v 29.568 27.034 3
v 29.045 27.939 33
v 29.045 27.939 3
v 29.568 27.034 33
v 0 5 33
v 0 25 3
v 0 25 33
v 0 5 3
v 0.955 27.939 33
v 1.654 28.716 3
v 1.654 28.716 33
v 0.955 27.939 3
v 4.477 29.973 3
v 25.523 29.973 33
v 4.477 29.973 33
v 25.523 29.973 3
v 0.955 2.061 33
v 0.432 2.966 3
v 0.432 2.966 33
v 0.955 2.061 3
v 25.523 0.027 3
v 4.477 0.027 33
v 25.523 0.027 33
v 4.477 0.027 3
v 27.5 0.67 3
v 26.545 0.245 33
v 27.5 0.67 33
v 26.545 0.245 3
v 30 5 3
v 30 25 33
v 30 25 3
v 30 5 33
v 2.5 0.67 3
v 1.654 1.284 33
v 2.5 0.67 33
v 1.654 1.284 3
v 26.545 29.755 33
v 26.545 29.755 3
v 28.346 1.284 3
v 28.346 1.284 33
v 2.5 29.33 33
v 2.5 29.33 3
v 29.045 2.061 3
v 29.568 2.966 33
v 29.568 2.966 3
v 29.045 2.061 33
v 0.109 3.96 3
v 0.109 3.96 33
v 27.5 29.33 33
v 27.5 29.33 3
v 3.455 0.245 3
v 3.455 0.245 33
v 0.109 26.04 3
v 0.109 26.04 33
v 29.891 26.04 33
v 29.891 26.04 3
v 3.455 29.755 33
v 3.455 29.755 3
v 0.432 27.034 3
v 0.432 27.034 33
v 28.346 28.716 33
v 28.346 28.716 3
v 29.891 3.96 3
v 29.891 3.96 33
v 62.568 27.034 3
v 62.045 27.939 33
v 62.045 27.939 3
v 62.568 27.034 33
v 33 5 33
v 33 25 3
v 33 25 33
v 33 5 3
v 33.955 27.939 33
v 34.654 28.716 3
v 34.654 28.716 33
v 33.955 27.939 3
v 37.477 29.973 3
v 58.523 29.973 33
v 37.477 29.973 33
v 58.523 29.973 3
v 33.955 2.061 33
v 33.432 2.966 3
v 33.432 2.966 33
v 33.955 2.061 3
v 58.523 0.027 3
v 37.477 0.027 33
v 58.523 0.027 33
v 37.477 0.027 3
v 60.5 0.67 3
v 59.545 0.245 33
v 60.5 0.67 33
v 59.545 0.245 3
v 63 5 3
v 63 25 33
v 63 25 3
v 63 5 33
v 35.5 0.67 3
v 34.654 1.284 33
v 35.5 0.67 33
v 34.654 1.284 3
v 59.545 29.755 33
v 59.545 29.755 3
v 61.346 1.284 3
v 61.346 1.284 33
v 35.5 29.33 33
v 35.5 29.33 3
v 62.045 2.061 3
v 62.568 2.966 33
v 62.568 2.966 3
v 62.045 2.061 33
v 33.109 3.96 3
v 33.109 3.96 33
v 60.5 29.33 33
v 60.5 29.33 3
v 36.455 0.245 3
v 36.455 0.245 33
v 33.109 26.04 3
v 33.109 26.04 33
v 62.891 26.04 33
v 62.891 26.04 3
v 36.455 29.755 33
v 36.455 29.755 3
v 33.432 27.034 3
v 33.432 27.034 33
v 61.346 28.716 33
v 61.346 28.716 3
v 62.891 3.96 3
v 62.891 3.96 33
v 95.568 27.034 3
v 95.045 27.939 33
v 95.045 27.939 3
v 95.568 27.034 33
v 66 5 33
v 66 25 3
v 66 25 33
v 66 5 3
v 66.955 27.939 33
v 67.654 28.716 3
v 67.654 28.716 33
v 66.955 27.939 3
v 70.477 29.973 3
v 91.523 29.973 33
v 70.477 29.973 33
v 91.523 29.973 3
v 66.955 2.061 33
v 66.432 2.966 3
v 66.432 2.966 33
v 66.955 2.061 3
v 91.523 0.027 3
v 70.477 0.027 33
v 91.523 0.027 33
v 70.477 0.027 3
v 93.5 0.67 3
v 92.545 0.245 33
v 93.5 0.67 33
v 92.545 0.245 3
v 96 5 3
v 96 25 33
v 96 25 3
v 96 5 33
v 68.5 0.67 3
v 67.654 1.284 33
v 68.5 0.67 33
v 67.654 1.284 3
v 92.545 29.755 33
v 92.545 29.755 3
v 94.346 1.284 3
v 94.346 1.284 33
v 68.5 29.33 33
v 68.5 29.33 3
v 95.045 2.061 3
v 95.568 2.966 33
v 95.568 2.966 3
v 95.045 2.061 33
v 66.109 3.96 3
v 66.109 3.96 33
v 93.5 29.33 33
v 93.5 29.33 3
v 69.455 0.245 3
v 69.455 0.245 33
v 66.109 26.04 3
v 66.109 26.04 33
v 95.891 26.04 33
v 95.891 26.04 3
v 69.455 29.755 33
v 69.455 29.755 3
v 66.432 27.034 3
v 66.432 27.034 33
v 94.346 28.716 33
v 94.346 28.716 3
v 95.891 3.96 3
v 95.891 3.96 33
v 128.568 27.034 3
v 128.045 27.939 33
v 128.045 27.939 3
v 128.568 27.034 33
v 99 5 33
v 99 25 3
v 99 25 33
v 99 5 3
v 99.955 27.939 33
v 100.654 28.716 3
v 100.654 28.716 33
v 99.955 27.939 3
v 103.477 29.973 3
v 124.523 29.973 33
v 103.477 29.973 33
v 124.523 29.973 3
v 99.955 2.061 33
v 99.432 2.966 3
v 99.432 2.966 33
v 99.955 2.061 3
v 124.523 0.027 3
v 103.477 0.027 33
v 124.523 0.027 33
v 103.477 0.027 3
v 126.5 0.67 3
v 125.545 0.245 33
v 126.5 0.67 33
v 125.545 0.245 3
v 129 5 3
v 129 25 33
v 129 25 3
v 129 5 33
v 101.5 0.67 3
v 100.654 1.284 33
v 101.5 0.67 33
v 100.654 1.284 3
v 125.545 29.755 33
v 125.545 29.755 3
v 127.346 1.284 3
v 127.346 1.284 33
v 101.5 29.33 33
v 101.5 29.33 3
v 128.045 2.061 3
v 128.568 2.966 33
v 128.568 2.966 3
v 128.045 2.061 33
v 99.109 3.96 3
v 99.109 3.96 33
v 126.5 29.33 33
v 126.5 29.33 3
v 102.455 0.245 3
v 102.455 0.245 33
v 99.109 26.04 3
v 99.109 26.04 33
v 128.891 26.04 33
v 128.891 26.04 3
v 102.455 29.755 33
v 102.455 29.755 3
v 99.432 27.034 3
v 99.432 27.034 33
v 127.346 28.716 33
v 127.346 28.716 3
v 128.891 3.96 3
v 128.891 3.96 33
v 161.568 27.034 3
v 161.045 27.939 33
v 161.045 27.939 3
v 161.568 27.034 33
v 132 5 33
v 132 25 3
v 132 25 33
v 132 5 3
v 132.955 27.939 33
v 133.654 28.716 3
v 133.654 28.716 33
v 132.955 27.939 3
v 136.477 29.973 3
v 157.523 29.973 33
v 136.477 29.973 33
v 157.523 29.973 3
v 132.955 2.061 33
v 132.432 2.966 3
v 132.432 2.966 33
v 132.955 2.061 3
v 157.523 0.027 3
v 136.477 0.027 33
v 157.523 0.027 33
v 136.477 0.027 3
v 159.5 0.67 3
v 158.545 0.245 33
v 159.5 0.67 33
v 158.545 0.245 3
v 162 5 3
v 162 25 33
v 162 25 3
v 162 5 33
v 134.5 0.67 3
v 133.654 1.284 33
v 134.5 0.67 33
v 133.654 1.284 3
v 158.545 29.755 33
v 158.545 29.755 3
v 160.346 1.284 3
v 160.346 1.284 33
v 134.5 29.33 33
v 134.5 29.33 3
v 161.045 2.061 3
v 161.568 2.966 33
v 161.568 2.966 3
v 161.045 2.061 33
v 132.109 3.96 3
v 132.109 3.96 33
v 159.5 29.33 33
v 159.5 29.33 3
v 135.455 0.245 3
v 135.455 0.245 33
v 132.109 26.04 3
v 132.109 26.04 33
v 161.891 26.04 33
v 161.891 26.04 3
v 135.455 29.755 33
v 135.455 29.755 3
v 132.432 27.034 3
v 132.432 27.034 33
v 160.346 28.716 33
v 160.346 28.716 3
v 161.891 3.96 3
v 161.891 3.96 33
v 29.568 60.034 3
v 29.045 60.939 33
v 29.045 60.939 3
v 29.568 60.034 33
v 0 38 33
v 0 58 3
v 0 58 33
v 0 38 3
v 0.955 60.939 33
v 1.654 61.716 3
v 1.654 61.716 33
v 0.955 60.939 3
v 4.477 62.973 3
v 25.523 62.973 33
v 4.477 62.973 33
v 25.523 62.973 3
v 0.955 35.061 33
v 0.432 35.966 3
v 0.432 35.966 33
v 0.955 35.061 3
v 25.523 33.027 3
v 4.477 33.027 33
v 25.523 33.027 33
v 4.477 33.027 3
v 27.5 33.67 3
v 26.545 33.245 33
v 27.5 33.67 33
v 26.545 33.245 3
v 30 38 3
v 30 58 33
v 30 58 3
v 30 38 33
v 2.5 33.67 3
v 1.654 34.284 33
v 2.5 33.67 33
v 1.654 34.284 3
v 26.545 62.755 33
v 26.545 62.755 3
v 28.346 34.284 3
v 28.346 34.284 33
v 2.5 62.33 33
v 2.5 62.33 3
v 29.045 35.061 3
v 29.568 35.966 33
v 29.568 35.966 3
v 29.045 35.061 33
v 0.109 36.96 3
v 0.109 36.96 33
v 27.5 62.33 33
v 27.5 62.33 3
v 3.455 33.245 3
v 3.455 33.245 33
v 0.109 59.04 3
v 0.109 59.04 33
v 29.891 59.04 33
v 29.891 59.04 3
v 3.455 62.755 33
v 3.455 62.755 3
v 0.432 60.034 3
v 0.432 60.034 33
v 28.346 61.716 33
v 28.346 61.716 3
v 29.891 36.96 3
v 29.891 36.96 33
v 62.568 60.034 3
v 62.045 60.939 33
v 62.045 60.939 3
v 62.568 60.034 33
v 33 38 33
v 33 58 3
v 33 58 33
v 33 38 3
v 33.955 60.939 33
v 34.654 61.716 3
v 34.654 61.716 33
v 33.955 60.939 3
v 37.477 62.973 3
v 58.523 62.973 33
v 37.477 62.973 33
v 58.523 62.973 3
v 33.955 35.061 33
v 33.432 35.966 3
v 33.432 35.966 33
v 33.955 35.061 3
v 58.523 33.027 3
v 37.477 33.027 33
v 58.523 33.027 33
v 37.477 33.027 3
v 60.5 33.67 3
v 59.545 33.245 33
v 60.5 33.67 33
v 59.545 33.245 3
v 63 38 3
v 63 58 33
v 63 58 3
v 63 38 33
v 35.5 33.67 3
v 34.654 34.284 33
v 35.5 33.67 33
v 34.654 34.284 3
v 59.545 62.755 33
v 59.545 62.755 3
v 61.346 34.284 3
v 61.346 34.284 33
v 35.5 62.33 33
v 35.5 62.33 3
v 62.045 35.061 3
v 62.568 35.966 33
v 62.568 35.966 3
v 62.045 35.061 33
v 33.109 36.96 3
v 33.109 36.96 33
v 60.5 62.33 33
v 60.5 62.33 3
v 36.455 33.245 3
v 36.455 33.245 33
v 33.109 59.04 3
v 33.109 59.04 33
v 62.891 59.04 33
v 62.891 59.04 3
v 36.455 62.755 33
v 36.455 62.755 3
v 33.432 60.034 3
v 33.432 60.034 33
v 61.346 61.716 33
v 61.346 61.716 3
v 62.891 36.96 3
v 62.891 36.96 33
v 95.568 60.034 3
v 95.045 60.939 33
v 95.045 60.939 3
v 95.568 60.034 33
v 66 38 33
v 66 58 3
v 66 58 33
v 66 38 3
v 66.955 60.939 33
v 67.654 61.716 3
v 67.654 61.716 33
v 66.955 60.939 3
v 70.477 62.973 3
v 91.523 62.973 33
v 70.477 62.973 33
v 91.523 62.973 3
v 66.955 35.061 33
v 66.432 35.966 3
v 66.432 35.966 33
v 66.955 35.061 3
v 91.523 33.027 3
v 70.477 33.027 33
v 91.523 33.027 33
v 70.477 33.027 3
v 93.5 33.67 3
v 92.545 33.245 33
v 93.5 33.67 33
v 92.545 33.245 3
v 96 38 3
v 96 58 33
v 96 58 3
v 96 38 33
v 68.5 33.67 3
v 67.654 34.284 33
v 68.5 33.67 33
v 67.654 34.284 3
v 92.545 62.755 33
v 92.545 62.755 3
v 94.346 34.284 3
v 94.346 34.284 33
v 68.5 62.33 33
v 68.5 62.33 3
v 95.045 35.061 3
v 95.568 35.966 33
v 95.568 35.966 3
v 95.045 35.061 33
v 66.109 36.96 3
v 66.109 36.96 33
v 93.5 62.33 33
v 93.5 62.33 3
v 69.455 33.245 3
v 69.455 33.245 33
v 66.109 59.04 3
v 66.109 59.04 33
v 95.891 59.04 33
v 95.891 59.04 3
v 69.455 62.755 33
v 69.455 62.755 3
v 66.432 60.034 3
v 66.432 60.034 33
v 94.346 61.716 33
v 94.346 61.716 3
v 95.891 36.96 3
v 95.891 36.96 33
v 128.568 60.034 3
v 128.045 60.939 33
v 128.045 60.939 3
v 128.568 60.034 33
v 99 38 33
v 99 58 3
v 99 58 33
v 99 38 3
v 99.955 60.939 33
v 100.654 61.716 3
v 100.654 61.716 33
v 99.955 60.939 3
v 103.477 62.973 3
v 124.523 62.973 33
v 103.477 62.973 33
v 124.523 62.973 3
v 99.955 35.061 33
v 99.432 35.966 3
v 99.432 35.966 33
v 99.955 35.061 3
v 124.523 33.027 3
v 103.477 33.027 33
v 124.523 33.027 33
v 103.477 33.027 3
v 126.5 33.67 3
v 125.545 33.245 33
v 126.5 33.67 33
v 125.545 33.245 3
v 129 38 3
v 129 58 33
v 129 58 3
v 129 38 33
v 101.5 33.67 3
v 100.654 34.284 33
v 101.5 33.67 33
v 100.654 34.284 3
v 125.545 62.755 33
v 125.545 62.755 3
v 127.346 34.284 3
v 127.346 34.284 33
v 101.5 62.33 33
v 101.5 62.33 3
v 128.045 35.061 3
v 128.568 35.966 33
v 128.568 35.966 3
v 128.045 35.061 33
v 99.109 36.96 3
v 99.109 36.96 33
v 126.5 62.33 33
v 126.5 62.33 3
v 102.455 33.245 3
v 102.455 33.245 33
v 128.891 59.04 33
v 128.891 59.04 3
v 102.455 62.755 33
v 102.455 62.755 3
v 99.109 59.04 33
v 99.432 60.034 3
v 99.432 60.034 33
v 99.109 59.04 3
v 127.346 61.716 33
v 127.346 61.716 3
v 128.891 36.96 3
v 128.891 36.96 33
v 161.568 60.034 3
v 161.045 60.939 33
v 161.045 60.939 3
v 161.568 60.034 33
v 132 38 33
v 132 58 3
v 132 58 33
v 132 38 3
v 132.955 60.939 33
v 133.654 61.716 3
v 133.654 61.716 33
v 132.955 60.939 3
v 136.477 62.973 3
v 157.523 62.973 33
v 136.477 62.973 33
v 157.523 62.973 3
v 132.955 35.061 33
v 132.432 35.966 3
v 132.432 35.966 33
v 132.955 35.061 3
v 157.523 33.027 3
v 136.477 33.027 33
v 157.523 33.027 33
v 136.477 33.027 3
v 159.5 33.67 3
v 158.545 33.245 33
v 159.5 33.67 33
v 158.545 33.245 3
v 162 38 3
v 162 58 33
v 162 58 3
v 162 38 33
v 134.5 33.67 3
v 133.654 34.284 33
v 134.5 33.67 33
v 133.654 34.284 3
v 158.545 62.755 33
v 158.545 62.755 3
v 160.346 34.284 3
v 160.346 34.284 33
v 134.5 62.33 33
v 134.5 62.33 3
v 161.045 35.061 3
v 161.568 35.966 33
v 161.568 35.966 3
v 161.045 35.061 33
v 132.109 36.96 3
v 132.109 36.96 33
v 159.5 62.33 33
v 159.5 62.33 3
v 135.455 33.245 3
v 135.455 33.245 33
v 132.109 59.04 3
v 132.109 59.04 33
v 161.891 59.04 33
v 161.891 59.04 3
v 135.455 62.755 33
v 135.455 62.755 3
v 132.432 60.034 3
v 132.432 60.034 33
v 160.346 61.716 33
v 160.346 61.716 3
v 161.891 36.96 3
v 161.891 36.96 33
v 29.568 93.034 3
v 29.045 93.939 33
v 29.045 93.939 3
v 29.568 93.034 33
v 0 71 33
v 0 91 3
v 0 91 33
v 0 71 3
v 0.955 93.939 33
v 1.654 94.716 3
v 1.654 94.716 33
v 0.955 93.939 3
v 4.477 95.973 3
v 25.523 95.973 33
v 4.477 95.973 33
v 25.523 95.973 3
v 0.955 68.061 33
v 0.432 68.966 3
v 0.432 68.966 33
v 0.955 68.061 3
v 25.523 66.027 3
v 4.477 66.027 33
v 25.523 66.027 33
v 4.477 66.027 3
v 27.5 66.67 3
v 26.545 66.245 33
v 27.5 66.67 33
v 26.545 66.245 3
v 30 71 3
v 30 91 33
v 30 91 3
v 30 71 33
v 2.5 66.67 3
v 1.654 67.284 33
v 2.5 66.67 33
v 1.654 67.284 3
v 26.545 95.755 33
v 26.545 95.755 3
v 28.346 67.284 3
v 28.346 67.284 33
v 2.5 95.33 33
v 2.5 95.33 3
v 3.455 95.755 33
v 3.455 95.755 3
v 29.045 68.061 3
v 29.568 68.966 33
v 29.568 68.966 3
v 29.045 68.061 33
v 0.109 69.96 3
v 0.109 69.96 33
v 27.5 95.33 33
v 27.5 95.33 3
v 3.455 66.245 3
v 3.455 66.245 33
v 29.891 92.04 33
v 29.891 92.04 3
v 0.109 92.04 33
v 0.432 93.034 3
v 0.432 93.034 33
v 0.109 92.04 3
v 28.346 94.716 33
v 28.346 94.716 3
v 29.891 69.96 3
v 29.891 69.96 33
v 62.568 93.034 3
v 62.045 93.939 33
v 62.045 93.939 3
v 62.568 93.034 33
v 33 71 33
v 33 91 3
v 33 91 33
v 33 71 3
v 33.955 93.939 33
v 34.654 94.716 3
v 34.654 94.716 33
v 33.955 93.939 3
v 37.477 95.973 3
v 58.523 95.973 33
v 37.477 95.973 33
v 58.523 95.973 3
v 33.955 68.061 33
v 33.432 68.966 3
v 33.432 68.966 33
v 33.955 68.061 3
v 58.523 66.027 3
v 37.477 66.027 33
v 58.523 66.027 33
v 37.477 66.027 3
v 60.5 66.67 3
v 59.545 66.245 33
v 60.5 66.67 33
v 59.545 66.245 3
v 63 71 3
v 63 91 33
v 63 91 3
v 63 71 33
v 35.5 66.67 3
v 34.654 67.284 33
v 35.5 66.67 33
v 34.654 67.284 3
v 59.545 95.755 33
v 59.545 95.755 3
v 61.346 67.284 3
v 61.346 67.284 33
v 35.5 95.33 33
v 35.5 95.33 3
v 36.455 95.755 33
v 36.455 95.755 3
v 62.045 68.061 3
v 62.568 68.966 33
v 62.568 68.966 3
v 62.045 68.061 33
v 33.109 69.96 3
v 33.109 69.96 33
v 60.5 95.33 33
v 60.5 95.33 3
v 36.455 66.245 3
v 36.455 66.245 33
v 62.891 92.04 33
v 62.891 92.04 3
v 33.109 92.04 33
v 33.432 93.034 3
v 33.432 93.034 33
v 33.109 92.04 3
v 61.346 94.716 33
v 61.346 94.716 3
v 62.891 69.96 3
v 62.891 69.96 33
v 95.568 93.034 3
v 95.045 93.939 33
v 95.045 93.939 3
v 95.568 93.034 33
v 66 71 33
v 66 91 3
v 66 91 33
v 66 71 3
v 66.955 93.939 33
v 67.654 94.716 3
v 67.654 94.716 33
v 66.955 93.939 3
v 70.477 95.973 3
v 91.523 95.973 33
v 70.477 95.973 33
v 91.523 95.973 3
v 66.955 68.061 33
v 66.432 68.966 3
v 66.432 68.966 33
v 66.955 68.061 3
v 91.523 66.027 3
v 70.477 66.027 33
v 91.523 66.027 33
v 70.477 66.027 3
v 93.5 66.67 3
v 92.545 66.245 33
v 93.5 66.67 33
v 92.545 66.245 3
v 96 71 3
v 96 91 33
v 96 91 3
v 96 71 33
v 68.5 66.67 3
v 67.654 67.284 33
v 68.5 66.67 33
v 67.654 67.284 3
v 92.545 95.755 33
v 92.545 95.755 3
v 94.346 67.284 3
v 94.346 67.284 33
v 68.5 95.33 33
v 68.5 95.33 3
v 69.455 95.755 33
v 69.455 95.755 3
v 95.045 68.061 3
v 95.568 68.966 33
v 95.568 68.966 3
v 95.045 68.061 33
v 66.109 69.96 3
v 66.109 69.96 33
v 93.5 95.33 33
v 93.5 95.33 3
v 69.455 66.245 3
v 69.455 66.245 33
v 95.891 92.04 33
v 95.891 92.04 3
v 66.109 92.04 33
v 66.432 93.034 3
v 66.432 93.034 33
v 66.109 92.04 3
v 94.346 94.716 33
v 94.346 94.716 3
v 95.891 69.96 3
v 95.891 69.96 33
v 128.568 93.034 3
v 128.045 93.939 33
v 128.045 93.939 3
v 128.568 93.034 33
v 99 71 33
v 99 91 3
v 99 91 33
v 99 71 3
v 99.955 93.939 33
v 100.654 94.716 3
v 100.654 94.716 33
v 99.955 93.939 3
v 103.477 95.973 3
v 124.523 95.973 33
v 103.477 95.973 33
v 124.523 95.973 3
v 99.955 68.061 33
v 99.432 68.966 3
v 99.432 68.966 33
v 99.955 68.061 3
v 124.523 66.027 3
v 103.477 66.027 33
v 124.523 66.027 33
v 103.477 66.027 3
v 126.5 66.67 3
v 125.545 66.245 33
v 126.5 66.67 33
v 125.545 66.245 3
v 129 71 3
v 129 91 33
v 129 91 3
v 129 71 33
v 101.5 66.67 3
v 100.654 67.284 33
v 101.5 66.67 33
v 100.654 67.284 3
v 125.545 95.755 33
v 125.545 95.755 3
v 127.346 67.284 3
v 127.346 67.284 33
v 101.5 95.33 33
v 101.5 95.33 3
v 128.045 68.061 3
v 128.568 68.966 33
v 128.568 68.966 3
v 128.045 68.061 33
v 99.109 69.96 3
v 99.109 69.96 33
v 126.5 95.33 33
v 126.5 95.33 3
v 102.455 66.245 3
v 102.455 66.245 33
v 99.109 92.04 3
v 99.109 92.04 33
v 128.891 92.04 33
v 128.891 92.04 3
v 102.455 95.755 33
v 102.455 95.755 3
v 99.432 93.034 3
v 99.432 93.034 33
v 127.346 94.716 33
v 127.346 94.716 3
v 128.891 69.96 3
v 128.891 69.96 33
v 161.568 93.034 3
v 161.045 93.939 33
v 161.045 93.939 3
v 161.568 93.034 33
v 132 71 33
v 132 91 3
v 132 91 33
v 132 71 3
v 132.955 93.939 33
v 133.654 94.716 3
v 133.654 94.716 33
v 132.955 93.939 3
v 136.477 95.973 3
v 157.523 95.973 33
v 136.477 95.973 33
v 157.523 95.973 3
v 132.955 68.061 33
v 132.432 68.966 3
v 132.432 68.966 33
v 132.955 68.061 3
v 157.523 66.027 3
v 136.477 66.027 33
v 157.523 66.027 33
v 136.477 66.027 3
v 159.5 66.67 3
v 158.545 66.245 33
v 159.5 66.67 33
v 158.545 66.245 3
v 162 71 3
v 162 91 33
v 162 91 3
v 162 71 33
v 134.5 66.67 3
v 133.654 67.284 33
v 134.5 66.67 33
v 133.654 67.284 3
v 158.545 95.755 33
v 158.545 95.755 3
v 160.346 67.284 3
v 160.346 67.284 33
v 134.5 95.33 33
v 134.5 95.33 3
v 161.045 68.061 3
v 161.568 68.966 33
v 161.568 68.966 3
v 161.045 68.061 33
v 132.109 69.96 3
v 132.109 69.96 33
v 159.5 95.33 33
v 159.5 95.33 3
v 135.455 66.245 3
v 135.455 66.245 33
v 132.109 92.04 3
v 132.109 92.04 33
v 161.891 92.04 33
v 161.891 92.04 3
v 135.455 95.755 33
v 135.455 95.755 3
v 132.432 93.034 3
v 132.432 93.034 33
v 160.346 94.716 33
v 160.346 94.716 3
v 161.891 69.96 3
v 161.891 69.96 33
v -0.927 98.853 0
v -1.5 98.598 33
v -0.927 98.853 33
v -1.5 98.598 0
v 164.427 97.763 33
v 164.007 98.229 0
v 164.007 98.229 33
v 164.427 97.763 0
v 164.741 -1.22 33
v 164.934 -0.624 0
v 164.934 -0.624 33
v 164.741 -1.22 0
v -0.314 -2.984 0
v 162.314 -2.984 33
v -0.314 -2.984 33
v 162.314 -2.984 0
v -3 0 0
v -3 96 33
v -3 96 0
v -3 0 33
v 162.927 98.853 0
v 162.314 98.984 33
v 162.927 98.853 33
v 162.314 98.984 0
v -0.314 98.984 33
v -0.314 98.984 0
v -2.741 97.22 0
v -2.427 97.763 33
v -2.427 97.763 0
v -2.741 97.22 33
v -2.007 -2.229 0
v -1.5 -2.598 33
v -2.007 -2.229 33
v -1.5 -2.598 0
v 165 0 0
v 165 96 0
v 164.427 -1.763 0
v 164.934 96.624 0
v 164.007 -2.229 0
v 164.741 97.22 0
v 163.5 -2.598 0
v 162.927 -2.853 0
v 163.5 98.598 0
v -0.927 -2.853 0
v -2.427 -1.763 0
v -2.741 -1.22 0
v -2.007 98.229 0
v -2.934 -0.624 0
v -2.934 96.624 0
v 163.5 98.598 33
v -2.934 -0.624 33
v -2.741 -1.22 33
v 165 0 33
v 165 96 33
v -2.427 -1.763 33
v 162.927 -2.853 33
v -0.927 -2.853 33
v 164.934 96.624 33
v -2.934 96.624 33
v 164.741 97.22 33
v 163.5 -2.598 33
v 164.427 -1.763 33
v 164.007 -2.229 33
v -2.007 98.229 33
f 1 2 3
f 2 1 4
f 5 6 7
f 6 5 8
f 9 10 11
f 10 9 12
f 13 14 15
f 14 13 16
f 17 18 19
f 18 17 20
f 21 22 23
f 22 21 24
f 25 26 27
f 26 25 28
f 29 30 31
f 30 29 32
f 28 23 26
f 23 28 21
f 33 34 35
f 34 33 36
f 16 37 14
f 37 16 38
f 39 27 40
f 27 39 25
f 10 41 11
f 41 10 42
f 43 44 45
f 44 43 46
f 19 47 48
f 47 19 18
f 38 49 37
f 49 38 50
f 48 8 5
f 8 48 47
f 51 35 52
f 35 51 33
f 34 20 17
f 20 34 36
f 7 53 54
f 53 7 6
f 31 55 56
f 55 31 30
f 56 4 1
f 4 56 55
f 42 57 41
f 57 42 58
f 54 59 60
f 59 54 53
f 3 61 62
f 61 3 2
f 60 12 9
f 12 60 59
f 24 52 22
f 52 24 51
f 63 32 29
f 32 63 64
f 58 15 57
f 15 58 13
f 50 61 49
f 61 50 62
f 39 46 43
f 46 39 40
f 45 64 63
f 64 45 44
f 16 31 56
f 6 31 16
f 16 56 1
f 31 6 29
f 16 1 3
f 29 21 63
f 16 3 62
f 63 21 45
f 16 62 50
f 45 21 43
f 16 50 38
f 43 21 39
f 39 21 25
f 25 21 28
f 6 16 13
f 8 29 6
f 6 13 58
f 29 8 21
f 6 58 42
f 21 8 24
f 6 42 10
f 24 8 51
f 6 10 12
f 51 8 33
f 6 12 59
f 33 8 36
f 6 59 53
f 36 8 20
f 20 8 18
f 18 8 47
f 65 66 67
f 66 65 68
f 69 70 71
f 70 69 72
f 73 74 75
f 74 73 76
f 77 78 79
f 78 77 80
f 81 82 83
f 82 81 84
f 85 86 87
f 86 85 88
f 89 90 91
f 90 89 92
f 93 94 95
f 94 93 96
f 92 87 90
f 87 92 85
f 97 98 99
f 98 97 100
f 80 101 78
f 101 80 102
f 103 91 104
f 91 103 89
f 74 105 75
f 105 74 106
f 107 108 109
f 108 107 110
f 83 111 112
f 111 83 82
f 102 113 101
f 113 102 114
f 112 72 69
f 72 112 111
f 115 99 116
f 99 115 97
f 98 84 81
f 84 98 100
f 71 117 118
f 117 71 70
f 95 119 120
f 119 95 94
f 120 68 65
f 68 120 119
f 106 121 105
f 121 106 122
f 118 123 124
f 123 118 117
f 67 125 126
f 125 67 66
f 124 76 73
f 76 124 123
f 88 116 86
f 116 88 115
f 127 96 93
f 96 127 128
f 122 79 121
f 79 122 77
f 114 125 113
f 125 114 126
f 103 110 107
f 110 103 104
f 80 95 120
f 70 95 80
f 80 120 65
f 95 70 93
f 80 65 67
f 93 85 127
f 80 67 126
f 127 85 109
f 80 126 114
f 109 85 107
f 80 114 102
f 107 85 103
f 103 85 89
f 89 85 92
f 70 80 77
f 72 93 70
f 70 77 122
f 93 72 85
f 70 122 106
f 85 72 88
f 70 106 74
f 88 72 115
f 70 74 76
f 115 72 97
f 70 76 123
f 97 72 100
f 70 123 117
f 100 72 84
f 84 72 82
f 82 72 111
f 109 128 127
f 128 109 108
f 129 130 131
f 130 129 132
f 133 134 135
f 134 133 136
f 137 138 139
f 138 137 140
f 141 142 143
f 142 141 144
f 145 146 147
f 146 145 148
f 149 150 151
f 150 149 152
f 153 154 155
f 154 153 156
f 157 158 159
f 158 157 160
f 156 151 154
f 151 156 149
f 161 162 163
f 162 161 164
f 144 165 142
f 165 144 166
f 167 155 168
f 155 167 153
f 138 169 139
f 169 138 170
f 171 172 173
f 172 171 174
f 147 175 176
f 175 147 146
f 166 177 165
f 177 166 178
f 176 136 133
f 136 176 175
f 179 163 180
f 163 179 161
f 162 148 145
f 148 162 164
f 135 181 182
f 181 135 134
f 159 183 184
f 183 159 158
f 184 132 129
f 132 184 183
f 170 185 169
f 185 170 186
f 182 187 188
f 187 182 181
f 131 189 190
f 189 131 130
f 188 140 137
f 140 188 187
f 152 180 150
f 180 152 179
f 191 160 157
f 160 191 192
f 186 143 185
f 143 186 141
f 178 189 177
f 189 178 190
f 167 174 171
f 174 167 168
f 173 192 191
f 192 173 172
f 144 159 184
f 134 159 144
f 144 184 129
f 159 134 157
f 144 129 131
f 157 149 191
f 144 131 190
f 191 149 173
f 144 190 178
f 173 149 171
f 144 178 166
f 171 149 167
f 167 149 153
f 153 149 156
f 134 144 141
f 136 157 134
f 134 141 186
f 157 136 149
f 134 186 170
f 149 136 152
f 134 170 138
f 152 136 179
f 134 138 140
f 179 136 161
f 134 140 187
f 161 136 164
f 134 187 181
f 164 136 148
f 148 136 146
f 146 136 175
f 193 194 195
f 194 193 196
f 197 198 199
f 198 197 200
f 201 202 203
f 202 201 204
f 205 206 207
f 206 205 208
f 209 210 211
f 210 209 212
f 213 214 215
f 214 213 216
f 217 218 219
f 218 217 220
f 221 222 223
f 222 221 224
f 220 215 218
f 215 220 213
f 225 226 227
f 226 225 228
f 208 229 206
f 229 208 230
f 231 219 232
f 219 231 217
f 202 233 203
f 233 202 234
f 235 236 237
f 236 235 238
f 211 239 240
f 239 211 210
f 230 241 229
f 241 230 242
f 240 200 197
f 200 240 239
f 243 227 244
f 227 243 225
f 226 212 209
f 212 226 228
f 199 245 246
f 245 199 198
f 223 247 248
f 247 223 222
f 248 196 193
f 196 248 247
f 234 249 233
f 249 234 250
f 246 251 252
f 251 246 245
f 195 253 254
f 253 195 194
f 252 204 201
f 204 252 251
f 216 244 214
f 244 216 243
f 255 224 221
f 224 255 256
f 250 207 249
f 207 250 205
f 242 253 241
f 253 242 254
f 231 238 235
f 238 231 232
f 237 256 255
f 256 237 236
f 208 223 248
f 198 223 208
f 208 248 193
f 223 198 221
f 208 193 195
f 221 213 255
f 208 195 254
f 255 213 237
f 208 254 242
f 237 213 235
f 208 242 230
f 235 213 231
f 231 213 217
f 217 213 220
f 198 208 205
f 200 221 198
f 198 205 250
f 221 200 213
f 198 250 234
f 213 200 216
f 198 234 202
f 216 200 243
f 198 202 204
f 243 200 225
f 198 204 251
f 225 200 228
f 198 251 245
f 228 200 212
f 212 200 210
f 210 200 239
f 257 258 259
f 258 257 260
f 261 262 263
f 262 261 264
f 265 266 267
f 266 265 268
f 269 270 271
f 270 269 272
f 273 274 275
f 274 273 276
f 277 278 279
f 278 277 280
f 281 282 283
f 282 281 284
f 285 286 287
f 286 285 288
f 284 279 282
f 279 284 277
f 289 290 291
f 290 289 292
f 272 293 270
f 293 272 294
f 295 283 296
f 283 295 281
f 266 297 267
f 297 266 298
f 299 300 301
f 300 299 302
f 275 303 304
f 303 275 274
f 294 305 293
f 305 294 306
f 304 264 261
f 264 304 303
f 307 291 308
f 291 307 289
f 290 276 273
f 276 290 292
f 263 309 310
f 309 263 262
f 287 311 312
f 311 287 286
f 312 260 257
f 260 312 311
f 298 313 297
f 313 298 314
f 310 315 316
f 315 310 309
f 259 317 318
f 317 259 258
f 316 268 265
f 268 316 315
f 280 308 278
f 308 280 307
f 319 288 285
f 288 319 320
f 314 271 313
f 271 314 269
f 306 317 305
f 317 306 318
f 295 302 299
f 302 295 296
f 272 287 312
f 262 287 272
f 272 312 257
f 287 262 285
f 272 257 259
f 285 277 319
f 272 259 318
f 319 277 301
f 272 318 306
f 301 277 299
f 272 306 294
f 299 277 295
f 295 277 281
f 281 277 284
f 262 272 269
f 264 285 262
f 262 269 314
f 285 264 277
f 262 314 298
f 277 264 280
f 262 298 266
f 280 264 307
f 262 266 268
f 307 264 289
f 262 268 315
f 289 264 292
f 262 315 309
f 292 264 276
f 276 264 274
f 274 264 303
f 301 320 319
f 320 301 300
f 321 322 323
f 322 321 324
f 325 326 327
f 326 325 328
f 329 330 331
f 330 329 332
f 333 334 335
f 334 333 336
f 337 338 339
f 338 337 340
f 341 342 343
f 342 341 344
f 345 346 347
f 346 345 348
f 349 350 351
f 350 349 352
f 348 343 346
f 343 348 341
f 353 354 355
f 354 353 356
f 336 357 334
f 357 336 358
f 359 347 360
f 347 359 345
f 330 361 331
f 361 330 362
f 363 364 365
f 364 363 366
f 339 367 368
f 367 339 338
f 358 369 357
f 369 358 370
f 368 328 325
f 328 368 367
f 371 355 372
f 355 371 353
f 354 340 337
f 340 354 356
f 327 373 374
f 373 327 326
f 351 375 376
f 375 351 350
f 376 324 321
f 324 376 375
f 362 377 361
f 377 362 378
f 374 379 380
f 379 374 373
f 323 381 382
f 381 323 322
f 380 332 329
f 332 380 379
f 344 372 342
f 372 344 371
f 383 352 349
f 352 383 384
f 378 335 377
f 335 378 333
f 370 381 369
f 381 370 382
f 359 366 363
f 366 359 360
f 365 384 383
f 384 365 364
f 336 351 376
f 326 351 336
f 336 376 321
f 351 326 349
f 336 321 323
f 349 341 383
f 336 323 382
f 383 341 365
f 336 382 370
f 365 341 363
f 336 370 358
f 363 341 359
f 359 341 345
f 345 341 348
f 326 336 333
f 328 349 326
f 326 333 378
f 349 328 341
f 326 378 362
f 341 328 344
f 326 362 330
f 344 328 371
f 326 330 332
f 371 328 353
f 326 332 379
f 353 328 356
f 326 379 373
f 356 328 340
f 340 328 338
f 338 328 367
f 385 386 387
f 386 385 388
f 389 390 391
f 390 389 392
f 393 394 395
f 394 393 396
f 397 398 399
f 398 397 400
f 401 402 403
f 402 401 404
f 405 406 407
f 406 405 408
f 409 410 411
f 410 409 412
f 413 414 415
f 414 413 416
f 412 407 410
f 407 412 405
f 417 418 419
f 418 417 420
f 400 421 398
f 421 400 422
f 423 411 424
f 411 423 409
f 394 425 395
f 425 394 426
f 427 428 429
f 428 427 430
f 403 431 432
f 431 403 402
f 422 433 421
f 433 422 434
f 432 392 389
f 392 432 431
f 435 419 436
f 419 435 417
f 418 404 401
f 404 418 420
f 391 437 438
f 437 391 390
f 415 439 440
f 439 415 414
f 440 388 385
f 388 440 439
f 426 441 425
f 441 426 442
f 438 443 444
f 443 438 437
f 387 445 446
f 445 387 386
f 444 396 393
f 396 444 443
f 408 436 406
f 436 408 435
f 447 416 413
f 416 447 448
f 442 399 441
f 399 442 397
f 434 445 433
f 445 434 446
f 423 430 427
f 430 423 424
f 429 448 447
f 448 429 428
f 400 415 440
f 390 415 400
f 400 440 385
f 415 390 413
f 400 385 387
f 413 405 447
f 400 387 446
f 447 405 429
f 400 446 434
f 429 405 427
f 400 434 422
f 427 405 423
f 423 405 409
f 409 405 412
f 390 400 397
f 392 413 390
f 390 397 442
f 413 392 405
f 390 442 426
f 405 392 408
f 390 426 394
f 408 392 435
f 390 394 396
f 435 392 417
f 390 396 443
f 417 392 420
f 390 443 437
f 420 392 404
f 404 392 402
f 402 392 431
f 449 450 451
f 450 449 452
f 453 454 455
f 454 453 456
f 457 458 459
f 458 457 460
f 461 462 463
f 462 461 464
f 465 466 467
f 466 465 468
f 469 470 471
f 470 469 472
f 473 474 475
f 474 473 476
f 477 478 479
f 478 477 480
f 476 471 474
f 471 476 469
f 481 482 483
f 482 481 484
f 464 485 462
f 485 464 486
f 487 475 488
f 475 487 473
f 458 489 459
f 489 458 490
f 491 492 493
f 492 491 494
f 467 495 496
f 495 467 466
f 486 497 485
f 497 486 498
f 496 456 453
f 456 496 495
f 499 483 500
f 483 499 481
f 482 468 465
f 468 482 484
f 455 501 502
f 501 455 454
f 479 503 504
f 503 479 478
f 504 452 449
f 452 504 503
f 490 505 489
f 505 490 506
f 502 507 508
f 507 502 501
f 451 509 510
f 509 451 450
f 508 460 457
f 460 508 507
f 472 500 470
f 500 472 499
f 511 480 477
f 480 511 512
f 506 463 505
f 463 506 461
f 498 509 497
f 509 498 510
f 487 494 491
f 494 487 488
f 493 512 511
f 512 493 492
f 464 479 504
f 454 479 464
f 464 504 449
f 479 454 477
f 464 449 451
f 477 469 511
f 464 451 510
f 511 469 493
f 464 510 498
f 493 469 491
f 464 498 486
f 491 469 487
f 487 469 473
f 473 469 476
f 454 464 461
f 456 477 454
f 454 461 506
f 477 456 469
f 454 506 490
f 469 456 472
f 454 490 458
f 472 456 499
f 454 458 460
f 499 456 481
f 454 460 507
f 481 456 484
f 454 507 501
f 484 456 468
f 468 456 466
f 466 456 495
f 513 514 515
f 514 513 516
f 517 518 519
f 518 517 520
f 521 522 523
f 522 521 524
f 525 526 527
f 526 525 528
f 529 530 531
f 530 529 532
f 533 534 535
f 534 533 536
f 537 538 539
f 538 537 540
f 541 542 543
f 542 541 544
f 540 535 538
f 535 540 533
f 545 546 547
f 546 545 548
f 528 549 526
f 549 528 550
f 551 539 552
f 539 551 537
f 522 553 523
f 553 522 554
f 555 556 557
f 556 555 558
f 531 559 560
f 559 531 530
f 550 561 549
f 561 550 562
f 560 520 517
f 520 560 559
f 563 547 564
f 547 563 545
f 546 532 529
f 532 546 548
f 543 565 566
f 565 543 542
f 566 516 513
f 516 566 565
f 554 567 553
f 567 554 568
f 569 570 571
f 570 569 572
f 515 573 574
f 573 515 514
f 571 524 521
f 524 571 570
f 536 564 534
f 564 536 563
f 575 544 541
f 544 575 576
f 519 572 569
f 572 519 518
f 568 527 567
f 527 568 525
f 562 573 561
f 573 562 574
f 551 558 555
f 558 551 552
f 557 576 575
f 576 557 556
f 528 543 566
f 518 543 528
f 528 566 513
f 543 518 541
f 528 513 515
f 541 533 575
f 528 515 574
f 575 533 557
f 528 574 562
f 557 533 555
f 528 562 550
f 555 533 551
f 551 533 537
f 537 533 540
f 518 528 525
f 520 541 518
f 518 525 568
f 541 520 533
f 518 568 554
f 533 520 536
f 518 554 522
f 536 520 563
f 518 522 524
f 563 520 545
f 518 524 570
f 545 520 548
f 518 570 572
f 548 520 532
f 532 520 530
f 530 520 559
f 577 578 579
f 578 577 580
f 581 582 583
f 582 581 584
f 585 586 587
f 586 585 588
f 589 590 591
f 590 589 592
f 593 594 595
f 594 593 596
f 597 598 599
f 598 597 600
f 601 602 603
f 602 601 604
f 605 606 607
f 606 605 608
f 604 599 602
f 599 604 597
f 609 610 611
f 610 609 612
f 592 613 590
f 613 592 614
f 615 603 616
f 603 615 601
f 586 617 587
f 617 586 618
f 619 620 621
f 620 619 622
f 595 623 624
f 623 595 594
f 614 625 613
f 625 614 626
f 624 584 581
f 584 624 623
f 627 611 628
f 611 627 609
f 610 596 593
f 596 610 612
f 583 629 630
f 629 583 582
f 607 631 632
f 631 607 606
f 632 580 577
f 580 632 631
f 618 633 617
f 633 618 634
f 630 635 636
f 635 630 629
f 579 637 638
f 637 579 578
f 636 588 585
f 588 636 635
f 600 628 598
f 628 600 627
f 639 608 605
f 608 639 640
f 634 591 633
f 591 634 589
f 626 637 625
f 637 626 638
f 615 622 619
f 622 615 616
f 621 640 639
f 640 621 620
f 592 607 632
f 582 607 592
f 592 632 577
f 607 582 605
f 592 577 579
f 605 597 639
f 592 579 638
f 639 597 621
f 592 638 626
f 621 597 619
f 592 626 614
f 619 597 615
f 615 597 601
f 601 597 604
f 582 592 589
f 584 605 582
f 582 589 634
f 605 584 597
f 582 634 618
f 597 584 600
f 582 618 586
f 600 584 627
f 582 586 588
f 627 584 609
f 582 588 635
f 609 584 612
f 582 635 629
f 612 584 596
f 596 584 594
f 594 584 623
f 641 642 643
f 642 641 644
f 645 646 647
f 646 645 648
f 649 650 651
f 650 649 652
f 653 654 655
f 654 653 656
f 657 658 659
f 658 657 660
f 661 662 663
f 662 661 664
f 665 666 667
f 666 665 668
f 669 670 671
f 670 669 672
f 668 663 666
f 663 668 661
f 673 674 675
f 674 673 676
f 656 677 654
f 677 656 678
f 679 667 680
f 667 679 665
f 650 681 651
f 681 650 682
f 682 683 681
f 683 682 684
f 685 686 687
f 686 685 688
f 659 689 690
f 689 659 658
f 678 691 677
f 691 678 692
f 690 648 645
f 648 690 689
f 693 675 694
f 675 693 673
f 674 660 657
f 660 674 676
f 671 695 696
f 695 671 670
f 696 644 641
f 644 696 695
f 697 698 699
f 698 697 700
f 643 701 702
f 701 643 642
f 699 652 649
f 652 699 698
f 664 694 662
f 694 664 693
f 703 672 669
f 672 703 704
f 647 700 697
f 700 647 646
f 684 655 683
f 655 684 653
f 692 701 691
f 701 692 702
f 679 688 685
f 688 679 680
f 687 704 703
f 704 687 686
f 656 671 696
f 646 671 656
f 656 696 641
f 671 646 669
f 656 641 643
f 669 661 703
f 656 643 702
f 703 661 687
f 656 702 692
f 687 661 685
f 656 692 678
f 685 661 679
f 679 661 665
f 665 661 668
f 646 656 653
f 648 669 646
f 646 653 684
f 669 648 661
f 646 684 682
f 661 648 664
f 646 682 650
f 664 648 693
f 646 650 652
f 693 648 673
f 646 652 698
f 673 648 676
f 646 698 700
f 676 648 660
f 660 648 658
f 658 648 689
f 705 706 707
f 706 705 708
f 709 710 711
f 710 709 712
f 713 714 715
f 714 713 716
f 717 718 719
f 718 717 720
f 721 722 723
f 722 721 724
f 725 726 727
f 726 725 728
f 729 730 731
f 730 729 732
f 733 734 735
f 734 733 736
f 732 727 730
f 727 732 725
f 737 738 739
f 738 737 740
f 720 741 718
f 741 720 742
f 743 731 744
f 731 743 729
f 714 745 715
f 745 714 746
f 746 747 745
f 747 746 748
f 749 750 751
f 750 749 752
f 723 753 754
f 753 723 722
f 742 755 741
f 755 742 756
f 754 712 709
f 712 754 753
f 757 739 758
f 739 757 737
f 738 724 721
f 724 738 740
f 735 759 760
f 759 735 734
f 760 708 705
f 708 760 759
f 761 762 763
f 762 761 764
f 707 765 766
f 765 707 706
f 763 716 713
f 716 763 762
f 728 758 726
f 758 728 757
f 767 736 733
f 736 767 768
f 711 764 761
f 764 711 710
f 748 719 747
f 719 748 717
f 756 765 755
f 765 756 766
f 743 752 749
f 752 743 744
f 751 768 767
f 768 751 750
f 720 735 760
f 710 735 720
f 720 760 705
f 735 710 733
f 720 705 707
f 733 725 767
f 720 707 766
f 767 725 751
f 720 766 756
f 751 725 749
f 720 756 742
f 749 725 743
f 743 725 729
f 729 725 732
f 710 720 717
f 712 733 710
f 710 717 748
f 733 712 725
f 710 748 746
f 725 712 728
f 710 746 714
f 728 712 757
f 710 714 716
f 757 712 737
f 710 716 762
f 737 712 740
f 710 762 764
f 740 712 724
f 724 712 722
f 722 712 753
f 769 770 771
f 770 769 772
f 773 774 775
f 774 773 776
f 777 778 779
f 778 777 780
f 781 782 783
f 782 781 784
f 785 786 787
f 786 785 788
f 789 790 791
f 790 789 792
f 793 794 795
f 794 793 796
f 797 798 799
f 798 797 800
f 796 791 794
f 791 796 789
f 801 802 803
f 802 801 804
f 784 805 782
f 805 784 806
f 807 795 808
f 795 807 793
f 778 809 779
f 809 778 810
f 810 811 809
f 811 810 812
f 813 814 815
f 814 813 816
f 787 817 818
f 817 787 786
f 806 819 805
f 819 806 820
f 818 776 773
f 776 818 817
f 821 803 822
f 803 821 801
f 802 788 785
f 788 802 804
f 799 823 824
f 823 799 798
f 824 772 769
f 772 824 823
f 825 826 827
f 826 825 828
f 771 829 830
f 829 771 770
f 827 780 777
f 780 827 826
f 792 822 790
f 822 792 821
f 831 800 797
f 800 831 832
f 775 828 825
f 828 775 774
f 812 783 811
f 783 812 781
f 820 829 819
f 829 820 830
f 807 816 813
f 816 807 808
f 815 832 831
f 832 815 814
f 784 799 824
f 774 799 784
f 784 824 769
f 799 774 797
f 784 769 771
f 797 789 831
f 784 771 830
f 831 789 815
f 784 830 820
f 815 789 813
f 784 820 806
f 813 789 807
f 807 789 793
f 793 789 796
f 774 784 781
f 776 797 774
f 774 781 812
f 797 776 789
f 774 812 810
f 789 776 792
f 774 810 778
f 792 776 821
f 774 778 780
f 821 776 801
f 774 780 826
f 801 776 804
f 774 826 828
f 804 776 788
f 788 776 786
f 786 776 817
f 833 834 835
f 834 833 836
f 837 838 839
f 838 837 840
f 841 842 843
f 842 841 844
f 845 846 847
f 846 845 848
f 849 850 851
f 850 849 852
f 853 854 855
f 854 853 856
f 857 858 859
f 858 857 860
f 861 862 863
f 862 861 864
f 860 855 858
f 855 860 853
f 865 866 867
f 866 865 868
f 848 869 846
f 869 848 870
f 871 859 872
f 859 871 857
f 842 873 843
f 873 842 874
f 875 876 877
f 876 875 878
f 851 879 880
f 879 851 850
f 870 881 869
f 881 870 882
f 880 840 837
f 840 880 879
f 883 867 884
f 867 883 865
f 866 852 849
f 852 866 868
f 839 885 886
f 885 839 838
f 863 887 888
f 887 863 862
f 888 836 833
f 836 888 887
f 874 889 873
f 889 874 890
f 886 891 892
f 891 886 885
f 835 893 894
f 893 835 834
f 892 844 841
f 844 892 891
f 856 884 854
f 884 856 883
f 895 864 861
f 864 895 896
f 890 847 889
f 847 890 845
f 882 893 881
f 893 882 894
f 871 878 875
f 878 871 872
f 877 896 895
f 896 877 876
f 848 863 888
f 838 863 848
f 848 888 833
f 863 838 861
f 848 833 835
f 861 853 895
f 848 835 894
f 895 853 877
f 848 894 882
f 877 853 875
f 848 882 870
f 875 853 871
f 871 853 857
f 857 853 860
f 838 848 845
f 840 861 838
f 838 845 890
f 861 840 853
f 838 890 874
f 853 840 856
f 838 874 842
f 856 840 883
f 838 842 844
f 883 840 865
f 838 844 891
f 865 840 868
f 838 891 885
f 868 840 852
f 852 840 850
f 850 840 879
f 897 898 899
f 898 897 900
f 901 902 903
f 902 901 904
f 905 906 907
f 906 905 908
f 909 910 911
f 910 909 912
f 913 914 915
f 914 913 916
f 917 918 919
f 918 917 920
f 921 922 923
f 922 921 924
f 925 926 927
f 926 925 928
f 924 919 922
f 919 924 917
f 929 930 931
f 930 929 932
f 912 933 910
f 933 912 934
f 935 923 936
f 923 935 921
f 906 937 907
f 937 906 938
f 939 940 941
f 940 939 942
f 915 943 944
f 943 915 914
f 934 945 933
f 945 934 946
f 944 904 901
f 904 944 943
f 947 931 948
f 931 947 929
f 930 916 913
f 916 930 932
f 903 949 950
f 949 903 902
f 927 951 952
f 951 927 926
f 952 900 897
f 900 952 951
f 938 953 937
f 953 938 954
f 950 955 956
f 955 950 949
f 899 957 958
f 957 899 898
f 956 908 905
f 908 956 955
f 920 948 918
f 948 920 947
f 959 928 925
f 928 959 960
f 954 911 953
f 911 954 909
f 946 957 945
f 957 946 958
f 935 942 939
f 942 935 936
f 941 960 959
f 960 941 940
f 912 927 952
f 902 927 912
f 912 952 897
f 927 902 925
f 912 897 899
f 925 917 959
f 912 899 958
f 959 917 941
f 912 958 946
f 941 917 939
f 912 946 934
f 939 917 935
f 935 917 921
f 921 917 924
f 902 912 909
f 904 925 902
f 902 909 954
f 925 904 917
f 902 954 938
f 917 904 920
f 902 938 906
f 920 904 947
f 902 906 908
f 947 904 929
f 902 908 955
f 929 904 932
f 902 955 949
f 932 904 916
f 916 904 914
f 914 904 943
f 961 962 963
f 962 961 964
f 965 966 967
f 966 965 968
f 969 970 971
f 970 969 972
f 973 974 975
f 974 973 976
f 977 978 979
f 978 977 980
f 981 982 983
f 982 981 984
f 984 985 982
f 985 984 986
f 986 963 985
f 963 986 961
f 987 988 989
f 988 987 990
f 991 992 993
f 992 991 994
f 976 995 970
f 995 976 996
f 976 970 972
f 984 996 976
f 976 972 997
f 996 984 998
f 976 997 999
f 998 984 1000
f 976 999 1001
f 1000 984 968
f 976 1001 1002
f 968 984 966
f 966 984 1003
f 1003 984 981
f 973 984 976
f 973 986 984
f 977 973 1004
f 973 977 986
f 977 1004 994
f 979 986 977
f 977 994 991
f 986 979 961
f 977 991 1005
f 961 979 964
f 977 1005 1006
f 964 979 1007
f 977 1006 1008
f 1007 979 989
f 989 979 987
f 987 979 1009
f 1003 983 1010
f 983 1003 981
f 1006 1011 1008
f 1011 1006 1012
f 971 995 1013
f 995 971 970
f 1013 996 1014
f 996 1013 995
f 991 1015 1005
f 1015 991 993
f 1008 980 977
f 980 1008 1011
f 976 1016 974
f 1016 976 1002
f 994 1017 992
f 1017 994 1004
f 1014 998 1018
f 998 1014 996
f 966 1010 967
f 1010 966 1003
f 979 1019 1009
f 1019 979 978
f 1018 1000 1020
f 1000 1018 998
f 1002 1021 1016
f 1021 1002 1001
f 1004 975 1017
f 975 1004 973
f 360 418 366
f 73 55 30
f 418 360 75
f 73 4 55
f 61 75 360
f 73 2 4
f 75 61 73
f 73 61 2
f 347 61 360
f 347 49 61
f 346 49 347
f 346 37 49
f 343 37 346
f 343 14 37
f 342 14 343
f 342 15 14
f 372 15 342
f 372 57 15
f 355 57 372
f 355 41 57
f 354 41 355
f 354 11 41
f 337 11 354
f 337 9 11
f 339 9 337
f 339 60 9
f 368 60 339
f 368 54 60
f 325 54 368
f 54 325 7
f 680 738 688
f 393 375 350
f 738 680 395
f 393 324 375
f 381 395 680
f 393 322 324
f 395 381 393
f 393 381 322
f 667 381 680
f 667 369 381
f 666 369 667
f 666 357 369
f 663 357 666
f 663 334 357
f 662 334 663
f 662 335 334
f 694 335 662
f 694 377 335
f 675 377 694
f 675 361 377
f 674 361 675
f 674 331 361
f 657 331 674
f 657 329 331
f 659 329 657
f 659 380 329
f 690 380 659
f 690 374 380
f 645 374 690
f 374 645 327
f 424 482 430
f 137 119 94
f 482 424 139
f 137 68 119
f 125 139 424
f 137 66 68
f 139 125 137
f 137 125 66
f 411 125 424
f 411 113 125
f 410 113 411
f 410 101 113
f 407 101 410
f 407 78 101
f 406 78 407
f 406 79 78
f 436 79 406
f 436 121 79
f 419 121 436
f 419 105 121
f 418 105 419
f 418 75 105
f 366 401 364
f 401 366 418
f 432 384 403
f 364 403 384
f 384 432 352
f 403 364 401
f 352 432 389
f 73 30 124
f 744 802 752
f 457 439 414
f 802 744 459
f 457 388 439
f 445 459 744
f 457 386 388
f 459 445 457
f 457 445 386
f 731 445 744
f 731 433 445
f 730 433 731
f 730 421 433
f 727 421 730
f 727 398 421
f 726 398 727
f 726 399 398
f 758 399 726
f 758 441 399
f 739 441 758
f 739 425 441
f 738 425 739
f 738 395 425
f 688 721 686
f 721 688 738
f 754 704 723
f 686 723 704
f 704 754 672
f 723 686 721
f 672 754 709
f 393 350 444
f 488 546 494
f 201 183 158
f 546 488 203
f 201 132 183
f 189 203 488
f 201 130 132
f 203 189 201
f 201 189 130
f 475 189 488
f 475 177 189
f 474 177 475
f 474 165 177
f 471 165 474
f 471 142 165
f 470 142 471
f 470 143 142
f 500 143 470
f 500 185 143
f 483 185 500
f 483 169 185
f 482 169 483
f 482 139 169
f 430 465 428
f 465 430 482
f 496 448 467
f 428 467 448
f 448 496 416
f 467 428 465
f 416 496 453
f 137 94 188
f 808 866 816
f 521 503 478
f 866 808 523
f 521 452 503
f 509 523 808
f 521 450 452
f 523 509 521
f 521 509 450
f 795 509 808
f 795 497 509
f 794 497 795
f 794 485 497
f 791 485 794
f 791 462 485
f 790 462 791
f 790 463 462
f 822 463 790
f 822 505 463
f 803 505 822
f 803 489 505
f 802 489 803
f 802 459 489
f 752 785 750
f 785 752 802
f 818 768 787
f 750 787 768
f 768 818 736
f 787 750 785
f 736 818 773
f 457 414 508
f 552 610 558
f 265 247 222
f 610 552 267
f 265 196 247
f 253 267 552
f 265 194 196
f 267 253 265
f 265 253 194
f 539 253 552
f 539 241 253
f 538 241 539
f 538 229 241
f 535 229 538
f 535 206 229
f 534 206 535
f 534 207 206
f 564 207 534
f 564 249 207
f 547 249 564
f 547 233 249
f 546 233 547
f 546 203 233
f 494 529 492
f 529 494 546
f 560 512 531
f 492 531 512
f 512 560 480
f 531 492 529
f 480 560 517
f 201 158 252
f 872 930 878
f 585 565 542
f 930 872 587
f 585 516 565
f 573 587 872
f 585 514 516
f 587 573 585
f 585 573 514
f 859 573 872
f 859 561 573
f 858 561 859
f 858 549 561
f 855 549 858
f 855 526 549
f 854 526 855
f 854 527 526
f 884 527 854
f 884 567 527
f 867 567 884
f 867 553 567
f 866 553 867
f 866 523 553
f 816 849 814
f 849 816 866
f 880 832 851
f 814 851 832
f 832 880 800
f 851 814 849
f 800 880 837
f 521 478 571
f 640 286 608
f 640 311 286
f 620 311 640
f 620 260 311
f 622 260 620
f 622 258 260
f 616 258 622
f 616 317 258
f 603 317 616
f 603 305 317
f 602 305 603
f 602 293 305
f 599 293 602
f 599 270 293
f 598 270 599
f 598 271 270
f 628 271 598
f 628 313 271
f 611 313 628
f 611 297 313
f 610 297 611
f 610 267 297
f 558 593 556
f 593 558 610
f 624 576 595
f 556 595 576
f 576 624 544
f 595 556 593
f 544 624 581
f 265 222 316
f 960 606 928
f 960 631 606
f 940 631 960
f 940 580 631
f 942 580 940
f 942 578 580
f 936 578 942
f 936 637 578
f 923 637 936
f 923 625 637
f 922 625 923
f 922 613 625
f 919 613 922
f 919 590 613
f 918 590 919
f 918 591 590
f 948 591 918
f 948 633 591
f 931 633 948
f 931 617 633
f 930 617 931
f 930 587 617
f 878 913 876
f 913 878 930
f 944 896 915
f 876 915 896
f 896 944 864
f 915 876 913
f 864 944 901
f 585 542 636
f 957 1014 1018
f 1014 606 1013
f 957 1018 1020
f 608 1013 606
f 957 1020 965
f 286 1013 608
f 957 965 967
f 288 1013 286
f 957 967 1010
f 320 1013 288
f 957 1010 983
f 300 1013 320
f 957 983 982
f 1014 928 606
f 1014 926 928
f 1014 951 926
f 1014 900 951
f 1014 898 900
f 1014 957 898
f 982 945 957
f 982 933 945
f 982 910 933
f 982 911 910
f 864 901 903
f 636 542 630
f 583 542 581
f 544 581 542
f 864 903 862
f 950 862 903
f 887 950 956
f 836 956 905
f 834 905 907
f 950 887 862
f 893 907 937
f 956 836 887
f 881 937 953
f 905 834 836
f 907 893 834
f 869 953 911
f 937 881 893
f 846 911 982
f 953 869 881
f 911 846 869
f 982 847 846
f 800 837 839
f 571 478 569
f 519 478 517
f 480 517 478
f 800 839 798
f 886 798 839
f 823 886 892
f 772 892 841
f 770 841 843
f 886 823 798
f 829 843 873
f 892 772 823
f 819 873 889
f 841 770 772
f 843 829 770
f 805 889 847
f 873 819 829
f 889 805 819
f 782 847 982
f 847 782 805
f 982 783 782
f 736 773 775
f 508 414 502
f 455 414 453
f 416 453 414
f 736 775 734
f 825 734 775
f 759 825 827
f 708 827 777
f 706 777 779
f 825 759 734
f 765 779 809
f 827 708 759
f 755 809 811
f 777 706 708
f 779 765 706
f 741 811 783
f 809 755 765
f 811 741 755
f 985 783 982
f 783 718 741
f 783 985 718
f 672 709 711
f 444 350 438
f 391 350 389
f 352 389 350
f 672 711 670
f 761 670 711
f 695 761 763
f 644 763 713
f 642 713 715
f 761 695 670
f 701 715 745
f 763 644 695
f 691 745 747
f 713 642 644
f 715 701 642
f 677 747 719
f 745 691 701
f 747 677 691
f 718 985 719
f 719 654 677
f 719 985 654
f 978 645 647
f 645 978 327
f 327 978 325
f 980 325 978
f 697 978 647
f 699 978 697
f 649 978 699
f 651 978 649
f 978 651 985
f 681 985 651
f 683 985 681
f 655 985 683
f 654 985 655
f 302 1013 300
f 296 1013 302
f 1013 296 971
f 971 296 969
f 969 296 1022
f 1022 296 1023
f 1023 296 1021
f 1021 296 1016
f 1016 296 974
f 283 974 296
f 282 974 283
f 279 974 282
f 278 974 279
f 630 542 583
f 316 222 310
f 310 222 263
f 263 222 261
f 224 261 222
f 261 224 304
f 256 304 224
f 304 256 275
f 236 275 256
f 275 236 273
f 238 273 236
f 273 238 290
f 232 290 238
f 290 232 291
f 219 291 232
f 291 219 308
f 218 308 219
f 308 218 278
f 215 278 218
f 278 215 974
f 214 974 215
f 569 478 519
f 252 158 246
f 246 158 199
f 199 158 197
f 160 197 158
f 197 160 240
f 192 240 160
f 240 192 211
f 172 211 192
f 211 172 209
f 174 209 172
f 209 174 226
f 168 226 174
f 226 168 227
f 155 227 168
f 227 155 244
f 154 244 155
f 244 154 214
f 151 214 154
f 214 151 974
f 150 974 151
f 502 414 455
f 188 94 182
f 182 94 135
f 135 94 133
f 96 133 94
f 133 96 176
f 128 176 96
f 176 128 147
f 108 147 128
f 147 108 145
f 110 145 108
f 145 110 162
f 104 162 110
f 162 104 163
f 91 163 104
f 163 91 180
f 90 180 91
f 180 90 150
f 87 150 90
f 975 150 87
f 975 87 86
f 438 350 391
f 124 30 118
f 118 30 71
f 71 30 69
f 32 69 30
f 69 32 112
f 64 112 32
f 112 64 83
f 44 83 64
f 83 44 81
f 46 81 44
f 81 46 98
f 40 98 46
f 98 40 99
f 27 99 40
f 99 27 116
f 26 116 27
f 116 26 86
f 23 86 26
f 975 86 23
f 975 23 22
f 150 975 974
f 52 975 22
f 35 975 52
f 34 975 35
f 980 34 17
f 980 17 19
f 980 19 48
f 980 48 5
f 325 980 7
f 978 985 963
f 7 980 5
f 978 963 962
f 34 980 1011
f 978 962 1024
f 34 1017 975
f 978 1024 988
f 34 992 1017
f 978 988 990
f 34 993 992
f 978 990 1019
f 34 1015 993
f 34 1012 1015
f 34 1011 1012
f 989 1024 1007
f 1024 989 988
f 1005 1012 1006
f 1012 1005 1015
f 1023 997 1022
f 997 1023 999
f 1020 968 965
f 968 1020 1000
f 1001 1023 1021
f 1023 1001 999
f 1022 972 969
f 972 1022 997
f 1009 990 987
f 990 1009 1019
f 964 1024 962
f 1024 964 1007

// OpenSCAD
numberOfColumns = 5; 
numberOfRows = 3; 

singleBoxWidth = 30;
singleBoxHeight = 30;

baseHeight = 3; 
boxHeight = 30; 

internalWallThickness = 3;
externalWallThickness = 3;

internalRadius = 5;
quality=30; // [10:60]

// ignore
$fn=quality;


module roundbox(r,wi,he,dz) {
	hull()
	{
		cube([wi, he, dz]);
		translate([0,0,0])
			cylinder(r=r, h=dz);
		translate([wi, 0, 0])
			cylinder(r=r, h=dz);
		translate([wi, he, 0])
			cylinder(r=r, h=dz);
		translate([0, he, 0])
			cylinder(r=r, h=dz);
	}

}


module organizer() {
	difference() {
	   roundbox(externalWallThickness, numberOfColumns*singleBoxWidth+(numberOfColumns-1)*internalWallThickness, numberOfRows*singleBoxHeight+(numberOfRows-1)*internalWallThickness, baseHeight+boxHeight);
	   for (y=[0:numberOfRows-1])
			for (x=[0:numberOfColumns-1]) {
				translate([(internalWallThickness+singleBoxWidth)*x, (internalWallThickness+singleBoxHeight)*y, baseHeight]) {
				translate([internalRadius,internalRadius,0])
					roundbox(internalRadius,singleBoxWidth-2*internalRadius,singleBoxHeight-2*internalRadius, boxHeight+1);
			}
		}
	}
}


organizer();
